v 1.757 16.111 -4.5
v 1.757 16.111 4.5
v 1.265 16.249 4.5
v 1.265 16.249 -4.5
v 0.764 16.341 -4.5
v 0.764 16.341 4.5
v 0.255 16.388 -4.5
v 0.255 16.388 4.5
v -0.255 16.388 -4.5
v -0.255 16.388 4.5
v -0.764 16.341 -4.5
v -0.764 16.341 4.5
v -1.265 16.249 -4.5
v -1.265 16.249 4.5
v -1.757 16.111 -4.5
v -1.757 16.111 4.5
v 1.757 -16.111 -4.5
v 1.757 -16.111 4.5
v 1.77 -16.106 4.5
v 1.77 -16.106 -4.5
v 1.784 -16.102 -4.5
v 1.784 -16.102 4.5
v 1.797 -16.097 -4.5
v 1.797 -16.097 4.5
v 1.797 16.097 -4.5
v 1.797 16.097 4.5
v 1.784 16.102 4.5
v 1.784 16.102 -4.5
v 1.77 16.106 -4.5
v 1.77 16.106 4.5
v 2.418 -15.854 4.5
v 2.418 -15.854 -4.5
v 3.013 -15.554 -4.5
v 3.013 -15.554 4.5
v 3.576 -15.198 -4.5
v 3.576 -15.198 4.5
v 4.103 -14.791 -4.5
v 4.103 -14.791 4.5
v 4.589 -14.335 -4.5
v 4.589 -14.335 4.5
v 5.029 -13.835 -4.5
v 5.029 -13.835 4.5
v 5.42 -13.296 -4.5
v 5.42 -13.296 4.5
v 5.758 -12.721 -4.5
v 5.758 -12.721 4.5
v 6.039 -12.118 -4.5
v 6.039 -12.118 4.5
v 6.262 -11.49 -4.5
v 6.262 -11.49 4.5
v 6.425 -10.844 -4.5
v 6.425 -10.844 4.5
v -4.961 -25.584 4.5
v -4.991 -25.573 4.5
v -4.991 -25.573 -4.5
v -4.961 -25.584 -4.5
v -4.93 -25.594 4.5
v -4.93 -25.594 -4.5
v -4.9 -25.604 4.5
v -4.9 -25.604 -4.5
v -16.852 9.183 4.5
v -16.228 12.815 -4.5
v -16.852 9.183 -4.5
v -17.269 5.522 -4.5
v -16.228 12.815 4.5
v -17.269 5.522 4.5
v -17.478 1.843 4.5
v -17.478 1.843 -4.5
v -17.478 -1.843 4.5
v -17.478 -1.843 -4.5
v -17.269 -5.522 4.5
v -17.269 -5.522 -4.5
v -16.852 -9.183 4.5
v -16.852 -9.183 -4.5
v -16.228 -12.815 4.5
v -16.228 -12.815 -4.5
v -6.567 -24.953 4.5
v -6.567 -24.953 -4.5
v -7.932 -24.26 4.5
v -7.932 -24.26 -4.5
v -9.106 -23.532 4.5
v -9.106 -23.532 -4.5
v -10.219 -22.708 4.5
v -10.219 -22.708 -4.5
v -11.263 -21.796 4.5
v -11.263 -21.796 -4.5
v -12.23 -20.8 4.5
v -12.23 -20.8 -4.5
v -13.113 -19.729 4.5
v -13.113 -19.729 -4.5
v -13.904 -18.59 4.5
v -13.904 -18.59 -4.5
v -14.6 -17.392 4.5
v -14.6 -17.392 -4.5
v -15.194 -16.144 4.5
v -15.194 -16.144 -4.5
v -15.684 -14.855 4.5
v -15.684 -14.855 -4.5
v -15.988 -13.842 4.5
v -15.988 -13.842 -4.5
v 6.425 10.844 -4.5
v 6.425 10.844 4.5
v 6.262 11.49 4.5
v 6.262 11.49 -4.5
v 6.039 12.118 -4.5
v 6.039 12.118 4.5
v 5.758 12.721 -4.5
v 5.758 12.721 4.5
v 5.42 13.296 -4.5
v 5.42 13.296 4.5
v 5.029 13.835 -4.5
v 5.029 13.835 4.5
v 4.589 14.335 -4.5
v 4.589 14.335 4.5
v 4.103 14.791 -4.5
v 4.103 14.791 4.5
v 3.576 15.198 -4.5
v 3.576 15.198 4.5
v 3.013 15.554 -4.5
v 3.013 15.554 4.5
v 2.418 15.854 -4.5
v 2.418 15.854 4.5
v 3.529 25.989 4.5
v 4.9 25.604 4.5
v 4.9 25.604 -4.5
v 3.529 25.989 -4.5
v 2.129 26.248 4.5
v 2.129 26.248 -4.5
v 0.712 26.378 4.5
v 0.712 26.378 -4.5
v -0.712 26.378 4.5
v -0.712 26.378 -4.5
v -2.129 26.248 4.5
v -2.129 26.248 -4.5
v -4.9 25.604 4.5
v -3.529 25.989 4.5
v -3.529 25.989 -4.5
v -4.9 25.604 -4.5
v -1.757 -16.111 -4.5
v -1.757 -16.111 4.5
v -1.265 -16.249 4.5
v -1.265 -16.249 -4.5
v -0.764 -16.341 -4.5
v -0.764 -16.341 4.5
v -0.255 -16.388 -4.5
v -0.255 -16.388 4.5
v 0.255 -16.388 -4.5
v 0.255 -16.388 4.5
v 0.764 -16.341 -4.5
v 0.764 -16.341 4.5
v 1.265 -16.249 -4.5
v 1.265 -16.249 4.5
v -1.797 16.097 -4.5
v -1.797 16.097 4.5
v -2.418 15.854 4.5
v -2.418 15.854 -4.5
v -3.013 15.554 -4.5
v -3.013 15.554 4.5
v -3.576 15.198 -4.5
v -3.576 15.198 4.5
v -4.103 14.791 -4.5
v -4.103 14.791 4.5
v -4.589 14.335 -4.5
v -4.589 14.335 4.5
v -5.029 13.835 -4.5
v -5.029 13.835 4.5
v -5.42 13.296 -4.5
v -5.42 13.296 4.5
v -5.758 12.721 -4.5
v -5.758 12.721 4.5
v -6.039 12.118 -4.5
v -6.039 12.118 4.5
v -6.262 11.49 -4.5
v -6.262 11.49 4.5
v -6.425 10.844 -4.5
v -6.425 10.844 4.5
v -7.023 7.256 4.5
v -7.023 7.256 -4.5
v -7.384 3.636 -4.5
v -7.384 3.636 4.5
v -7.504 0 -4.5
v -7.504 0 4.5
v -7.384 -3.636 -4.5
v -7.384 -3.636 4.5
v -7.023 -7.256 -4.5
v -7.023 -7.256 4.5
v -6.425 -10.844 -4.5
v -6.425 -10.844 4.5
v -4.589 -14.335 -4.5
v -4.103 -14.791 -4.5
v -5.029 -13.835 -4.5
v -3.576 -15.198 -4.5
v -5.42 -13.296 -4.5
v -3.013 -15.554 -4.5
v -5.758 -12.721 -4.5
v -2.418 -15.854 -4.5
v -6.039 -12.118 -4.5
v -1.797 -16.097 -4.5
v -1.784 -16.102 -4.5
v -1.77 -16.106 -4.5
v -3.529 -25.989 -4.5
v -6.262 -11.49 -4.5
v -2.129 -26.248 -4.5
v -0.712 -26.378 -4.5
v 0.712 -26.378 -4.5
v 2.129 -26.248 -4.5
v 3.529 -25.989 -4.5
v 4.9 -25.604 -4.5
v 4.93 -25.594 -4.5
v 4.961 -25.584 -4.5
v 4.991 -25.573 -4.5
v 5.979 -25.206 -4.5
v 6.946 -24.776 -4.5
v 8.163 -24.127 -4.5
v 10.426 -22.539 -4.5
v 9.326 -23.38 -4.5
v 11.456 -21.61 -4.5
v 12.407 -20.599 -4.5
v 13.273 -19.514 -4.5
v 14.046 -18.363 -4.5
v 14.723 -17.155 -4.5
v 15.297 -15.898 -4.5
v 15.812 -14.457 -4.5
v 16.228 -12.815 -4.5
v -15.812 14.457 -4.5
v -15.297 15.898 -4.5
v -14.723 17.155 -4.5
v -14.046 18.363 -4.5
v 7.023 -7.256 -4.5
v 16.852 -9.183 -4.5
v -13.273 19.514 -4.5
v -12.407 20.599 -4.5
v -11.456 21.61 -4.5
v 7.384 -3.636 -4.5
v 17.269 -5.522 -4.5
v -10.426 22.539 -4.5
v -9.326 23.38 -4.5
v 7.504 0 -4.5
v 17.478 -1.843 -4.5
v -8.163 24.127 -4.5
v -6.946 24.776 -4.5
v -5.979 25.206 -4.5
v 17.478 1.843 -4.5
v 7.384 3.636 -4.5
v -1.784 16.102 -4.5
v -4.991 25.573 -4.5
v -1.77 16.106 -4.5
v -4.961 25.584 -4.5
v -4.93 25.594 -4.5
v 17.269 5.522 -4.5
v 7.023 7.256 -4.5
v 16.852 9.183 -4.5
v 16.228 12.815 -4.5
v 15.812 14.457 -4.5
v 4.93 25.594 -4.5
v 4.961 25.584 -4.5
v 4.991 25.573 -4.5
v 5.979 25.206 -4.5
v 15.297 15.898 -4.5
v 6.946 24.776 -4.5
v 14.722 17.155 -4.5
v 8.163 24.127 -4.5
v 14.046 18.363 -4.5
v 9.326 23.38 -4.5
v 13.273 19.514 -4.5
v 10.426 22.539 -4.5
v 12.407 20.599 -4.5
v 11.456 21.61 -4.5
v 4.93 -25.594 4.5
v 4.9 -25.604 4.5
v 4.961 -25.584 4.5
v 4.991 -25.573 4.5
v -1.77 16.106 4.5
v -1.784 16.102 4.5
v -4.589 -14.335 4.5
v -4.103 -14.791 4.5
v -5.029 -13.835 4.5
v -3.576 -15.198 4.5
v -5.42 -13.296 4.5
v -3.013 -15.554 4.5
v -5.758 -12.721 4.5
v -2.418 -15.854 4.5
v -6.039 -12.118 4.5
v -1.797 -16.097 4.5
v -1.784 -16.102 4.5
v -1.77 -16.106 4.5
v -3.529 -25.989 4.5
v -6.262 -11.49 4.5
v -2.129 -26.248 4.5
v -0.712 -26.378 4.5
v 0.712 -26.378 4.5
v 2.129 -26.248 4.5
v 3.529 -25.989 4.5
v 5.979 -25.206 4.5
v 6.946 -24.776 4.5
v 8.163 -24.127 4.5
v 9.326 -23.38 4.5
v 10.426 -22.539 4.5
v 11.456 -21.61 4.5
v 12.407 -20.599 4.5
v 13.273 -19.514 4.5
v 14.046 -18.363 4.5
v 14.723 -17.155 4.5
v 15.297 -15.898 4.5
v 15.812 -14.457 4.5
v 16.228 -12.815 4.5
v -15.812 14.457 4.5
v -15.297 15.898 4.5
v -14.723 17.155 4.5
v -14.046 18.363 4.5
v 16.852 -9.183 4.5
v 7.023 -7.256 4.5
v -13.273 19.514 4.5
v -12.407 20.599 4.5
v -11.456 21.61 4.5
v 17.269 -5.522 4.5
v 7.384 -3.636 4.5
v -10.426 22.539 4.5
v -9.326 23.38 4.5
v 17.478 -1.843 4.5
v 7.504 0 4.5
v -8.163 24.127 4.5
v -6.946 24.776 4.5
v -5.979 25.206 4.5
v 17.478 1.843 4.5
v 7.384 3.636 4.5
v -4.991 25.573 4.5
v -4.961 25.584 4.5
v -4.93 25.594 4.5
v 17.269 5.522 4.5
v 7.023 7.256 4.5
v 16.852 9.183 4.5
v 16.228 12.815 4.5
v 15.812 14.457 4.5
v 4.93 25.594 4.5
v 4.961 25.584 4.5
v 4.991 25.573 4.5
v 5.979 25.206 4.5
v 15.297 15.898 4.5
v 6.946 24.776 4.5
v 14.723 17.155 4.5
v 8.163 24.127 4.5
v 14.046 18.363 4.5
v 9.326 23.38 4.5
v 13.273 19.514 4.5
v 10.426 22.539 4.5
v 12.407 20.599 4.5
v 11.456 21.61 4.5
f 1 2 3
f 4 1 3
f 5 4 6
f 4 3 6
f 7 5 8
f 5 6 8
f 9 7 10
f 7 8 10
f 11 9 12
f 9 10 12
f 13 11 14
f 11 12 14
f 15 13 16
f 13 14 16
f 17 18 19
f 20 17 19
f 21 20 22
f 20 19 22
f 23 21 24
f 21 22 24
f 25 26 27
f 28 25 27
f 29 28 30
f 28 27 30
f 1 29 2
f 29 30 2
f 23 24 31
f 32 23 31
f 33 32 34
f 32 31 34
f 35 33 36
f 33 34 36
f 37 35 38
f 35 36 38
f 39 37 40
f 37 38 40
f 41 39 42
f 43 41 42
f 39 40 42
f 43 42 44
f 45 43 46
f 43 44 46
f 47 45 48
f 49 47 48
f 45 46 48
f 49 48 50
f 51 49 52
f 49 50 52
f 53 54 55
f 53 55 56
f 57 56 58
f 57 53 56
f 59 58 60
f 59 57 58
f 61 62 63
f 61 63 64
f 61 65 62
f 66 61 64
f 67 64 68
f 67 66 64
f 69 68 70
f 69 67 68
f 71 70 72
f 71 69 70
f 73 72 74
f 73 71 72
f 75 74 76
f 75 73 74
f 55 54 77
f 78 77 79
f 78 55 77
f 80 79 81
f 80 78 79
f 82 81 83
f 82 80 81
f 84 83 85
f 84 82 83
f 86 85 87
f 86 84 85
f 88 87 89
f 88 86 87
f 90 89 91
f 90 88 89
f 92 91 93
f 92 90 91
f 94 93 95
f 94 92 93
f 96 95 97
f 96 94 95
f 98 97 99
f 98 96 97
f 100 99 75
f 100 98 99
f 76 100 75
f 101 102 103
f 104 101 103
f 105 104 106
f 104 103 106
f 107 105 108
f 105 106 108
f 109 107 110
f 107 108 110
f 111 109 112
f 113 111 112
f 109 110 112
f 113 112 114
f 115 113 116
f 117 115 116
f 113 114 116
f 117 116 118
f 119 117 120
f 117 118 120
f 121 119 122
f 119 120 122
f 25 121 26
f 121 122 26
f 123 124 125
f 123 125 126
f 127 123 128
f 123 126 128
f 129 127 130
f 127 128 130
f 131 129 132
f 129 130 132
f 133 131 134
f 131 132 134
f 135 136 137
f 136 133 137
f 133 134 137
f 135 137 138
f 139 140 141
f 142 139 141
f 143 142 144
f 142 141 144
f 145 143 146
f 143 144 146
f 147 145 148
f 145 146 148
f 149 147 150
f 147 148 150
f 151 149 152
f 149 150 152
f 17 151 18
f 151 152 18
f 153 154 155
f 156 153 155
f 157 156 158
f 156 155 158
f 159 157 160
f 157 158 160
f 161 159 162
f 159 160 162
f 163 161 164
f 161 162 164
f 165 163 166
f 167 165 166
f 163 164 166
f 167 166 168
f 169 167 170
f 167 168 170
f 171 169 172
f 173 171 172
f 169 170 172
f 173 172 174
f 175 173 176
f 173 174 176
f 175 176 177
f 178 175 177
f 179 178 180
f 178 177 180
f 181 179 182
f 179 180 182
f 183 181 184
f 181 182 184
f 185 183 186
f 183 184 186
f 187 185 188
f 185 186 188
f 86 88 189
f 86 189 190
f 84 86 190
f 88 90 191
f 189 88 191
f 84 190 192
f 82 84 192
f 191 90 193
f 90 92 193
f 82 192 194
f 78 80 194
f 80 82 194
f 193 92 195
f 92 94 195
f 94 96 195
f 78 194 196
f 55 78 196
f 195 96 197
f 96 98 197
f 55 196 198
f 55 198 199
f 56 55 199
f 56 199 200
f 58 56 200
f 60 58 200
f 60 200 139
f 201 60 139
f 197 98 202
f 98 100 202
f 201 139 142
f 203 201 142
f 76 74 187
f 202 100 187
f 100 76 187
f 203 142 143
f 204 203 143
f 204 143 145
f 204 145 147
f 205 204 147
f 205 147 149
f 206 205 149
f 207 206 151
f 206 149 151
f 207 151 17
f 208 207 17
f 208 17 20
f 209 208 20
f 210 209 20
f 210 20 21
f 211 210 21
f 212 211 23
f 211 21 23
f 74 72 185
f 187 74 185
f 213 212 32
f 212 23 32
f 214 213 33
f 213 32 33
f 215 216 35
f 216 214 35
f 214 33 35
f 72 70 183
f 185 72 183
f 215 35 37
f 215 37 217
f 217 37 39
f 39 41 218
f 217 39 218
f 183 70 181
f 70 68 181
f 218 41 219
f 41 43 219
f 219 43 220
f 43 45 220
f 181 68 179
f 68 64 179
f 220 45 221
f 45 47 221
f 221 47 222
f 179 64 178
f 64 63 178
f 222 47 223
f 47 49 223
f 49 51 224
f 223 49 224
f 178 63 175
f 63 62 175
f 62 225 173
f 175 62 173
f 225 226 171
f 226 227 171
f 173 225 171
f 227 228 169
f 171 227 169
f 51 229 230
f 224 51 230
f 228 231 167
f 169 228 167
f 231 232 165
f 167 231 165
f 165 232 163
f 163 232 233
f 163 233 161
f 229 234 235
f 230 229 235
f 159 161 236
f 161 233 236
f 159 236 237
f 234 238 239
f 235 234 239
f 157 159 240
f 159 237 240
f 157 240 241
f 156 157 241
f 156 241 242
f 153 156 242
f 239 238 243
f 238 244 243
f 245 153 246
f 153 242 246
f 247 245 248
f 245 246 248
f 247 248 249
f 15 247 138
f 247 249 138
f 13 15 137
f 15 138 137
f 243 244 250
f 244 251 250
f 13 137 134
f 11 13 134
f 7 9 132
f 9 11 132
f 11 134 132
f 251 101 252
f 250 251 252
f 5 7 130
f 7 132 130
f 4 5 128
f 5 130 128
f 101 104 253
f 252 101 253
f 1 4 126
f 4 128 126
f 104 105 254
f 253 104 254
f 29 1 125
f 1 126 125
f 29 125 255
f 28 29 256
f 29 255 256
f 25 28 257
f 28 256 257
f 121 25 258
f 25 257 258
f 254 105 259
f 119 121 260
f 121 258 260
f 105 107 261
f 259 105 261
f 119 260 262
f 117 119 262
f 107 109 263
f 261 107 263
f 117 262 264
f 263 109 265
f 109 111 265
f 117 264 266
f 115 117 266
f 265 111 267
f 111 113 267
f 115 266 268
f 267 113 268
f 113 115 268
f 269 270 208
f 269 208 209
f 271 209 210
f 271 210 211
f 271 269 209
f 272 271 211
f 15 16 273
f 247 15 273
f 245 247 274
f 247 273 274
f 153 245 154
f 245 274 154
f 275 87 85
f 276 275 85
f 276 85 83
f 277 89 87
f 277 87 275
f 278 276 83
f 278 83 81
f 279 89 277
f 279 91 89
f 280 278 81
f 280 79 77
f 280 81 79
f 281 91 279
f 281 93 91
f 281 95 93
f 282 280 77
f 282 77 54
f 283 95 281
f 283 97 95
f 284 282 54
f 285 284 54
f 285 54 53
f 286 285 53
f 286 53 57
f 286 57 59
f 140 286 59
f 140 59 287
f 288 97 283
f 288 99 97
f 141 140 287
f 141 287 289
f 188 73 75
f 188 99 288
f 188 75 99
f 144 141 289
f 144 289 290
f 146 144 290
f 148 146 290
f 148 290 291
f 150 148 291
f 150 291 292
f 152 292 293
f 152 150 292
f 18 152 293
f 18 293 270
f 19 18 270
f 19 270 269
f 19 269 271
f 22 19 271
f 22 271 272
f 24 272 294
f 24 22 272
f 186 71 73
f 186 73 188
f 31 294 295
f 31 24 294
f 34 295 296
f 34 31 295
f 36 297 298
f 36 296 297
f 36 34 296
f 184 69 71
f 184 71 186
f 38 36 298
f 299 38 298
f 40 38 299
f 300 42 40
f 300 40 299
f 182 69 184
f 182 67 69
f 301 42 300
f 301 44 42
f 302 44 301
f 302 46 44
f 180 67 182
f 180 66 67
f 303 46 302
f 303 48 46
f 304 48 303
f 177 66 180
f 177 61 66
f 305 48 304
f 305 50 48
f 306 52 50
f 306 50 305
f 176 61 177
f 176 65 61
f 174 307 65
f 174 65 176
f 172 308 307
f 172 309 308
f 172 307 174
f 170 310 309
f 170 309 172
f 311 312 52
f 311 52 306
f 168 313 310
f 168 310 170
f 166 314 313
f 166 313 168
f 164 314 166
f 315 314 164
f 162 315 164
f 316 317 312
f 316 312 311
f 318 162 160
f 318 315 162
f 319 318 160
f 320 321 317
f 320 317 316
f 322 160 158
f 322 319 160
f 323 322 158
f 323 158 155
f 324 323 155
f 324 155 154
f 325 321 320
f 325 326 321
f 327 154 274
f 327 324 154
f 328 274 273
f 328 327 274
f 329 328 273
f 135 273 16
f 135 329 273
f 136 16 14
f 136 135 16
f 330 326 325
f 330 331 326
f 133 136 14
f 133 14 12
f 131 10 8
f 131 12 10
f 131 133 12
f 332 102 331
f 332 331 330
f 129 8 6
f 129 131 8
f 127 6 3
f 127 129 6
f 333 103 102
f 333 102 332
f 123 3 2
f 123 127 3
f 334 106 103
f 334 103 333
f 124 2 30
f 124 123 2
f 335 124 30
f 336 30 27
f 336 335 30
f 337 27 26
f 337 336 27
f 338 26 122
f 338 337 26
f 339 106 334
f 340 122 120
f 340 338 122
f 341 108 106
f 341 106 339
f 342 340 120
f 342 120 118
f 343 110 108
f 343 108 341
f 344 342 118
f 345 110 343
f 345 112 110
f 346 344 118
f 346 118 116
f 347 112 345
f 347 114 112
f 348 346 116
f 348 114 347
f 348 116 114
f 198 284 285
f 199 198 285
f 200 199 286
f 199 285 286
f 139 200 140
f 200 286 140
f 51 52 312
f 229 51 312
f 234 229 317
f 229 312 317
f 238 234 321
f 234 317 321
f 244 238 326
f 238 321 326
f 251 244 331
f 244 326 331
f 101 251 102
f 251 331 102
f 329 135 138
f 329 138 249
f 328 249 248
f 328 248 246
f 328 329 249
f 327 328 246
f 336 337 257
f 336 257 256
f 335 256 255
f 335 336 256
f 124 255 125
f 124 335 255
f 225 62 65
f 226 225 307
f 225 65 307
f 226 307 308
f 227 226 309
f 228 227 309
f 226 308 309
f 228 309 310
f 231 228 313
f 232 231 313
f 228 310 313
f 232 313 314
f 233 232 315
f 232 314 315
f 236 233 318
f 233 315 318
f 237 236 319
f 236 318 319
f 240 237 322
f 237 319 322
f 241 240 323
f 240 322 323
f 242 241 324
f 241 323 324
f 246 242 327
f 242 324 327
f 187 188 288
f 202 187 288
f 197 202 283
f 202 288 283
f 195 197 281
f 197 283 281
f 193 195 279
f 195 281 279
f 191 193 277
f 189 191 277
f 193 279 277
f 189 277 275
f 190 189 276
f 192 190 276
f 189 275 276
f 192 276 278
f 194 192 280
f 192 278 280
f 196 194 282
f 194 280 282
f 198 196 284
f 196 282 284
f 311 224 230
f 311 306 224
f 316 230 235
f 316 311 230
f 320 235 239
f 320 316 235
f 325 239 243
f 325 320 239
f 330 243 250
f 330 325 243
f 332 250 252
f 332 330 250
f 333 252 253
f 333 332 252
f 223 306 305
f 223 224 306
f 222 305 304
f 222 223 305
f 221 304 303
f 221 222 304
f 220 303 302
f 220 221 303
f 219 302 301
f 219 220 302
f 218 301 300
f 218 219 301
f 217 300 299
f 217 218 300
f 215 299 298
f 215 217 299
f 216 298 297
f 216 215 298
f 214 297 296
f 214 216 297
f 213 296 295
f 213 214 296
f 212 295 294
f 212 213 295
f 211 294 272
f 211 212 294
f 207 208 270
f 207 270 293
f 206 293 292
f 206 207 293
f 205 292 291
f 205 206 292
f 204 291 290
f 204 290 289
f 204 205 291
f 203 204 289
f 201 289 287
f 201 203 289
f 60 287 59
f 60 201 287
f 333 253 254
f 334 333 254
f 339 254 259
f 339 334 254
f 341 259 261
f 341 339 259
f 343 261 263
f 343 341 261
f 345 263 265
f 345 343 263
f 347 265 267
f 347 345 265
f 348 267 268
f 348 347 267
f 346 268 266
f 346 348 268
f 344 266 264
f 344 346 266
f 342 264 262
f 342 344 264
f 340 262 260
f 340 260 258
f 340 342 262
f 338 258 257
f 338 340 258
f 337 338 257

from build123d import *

# Parameters (mm, degrees)
F1_DEPTH    = 4.5
F2_R        = 17
F3_T1_DEPTH = 33.9045095963
F5_DEPTH    = 9


# Not quite as in the source:
# - a fillet or chamfer that OpenCascade refuses, or shapes differently, is made with other operations: its cross-section is extruded or revolved along the edge and cut away or added


with BuildPart() as f1:
    # F0 (on Top) → F1 (new body, symmetric)
    with BuildSketch(Plane.XY):
        with BuildLine():
            ThreePointArc((15.375, -16.5), (17.5041005313, 0), (15.375, 16.5))
            ThreePointArc((15.375, 16.5), (9.0566864996, 23.6051242432), (0, 26.5))
            ThreePointArc((0, 26.5), (-9.0566864996, 23.6051242432), (-15.375, 16.5))
            ThreePointArc((-15.375, 16.5), (-17.5041005313, 0), (-15.375, -16.5))
            ThreePointArc((-15.375, -16.5), (-9.0566864996, -23.6051242432), (0, -26.5))
            ThreePointArc((0, -26.5), (9.0566864996, -23.6051242432), (15.375, -16.5))
        make_face()
    extrude(amount=F1_DEPTH, both=True)

    # F2
    f2_edges = [f1.edges().sort_by_distance(p)[0] for p in [
        (-15.375, 16.5, 0),
        (-15.375, -16.5, 0),
        (15.375, -16.5, 0),
        (15.375, 16.5, 0),
    ]]
    fillet(f2_edges, radius=F2_R)

    # F3: fillet of radius 15.59 on 2 edges, made by hand

    # F3_s2 → F3_t1 (cut)
    with BuildSketch(Plane.XY.offset(-16.9522547982)):
        with BuildLine():
            ThreePointArc((4.8996291219, 25.603887062), (0, 26.3938284652), (-4.8996291219, 25.603887062))
            ThreePointArc((-4.8996291219, 25.603887062), (-2.4809605234, 26.222238656), (0, 26.5))
            ThreePointArc((0, 26.5), (2.4809605234, 26.222238656), (4.8996291219, 25.603887062))
        make_face()
        with BuildLine():
            ThreePointArc((4.8996291219, -25.603887062), (0, -26.3938284652), (-4.8996291219, -25.603887062))
            ThreePointArc((-4.8996291219, -25.603887062), (-2.4809605234, -26.222238656), (0, -26.5))
            ThreePointArc((0, -26.5), (2.4809605234, -26.222238656), (4.8996291219, -25.603887062))
        make_face()
    extrude(amount=F3_T1_DEPTH, mode=Mode.SUBTRACT)

    # F4 (on face) → F5 (cut, through all)
    with BuildSketch(Plane.XY.offset(4.5)):
        with BuildLine():
            ThreePointArc((-6.424547387, 10.8436806891), (-7.5041005313, 0), (-6.424547387, -10.8436806891))
            ThreePointArc((-6.424547387, -10.8436806891), (-4.8148810997, -14.0903093829), (-1.797468323, -16.0970090531))
            ThreePointArc((-1.797468323, -16.0970090531), (-1.7771565537, -16.1038240182), (-1.7568266062, -16.1105845625))
            ThreePointArc((-1.7568266062, -16.1105845625), (0, -16.3938284652), (1.7568266062, -16.1105845625))
            ThreePointArc((1.7568266062, -16.1105845625), (1.7771565537, -16.1038240182), (1.797468323, -16.0970090531))
            ThreePointArc((1.797468323, -16.0970090531), (4.8148810997, -14.0903093829), (6.424547387, -10.8436806891))
            ThreePointArc((6.424547387, -10.8436806891), (7.5041005313, 0), (6.424547387, 10.8436806891))
            ThreePointArc((6.424547387, 10.8436806891), (4.8148810997, 14.0903093829), (1.797468323, 16.0970090531))
            ThreePointArc((1.797468323, 16.0970090531), (1.7771565537, 16.1038240182), (1.7568266062, 16.1105845625))
            ThreePointArc((1.7568266062, 16.1105845625), (0, 16.3938284652), (-1.7568266062, 16.1105845625))
            ThreePointArc((-1.7568266062, 16.1105845625), (-1.7771565537, 16.1038240182), (-1.797468323, 16.0970090531))
            ThreePointArc((-1.797468323, 16.0970090531), (-4.8148810997, 14.0903093829), (-6.424547387, 10.8436806891))
        make_face()
    extrude(amount=-F5_DEPTH, mode=Mode.SUBTRACT)


solid = f1.part
